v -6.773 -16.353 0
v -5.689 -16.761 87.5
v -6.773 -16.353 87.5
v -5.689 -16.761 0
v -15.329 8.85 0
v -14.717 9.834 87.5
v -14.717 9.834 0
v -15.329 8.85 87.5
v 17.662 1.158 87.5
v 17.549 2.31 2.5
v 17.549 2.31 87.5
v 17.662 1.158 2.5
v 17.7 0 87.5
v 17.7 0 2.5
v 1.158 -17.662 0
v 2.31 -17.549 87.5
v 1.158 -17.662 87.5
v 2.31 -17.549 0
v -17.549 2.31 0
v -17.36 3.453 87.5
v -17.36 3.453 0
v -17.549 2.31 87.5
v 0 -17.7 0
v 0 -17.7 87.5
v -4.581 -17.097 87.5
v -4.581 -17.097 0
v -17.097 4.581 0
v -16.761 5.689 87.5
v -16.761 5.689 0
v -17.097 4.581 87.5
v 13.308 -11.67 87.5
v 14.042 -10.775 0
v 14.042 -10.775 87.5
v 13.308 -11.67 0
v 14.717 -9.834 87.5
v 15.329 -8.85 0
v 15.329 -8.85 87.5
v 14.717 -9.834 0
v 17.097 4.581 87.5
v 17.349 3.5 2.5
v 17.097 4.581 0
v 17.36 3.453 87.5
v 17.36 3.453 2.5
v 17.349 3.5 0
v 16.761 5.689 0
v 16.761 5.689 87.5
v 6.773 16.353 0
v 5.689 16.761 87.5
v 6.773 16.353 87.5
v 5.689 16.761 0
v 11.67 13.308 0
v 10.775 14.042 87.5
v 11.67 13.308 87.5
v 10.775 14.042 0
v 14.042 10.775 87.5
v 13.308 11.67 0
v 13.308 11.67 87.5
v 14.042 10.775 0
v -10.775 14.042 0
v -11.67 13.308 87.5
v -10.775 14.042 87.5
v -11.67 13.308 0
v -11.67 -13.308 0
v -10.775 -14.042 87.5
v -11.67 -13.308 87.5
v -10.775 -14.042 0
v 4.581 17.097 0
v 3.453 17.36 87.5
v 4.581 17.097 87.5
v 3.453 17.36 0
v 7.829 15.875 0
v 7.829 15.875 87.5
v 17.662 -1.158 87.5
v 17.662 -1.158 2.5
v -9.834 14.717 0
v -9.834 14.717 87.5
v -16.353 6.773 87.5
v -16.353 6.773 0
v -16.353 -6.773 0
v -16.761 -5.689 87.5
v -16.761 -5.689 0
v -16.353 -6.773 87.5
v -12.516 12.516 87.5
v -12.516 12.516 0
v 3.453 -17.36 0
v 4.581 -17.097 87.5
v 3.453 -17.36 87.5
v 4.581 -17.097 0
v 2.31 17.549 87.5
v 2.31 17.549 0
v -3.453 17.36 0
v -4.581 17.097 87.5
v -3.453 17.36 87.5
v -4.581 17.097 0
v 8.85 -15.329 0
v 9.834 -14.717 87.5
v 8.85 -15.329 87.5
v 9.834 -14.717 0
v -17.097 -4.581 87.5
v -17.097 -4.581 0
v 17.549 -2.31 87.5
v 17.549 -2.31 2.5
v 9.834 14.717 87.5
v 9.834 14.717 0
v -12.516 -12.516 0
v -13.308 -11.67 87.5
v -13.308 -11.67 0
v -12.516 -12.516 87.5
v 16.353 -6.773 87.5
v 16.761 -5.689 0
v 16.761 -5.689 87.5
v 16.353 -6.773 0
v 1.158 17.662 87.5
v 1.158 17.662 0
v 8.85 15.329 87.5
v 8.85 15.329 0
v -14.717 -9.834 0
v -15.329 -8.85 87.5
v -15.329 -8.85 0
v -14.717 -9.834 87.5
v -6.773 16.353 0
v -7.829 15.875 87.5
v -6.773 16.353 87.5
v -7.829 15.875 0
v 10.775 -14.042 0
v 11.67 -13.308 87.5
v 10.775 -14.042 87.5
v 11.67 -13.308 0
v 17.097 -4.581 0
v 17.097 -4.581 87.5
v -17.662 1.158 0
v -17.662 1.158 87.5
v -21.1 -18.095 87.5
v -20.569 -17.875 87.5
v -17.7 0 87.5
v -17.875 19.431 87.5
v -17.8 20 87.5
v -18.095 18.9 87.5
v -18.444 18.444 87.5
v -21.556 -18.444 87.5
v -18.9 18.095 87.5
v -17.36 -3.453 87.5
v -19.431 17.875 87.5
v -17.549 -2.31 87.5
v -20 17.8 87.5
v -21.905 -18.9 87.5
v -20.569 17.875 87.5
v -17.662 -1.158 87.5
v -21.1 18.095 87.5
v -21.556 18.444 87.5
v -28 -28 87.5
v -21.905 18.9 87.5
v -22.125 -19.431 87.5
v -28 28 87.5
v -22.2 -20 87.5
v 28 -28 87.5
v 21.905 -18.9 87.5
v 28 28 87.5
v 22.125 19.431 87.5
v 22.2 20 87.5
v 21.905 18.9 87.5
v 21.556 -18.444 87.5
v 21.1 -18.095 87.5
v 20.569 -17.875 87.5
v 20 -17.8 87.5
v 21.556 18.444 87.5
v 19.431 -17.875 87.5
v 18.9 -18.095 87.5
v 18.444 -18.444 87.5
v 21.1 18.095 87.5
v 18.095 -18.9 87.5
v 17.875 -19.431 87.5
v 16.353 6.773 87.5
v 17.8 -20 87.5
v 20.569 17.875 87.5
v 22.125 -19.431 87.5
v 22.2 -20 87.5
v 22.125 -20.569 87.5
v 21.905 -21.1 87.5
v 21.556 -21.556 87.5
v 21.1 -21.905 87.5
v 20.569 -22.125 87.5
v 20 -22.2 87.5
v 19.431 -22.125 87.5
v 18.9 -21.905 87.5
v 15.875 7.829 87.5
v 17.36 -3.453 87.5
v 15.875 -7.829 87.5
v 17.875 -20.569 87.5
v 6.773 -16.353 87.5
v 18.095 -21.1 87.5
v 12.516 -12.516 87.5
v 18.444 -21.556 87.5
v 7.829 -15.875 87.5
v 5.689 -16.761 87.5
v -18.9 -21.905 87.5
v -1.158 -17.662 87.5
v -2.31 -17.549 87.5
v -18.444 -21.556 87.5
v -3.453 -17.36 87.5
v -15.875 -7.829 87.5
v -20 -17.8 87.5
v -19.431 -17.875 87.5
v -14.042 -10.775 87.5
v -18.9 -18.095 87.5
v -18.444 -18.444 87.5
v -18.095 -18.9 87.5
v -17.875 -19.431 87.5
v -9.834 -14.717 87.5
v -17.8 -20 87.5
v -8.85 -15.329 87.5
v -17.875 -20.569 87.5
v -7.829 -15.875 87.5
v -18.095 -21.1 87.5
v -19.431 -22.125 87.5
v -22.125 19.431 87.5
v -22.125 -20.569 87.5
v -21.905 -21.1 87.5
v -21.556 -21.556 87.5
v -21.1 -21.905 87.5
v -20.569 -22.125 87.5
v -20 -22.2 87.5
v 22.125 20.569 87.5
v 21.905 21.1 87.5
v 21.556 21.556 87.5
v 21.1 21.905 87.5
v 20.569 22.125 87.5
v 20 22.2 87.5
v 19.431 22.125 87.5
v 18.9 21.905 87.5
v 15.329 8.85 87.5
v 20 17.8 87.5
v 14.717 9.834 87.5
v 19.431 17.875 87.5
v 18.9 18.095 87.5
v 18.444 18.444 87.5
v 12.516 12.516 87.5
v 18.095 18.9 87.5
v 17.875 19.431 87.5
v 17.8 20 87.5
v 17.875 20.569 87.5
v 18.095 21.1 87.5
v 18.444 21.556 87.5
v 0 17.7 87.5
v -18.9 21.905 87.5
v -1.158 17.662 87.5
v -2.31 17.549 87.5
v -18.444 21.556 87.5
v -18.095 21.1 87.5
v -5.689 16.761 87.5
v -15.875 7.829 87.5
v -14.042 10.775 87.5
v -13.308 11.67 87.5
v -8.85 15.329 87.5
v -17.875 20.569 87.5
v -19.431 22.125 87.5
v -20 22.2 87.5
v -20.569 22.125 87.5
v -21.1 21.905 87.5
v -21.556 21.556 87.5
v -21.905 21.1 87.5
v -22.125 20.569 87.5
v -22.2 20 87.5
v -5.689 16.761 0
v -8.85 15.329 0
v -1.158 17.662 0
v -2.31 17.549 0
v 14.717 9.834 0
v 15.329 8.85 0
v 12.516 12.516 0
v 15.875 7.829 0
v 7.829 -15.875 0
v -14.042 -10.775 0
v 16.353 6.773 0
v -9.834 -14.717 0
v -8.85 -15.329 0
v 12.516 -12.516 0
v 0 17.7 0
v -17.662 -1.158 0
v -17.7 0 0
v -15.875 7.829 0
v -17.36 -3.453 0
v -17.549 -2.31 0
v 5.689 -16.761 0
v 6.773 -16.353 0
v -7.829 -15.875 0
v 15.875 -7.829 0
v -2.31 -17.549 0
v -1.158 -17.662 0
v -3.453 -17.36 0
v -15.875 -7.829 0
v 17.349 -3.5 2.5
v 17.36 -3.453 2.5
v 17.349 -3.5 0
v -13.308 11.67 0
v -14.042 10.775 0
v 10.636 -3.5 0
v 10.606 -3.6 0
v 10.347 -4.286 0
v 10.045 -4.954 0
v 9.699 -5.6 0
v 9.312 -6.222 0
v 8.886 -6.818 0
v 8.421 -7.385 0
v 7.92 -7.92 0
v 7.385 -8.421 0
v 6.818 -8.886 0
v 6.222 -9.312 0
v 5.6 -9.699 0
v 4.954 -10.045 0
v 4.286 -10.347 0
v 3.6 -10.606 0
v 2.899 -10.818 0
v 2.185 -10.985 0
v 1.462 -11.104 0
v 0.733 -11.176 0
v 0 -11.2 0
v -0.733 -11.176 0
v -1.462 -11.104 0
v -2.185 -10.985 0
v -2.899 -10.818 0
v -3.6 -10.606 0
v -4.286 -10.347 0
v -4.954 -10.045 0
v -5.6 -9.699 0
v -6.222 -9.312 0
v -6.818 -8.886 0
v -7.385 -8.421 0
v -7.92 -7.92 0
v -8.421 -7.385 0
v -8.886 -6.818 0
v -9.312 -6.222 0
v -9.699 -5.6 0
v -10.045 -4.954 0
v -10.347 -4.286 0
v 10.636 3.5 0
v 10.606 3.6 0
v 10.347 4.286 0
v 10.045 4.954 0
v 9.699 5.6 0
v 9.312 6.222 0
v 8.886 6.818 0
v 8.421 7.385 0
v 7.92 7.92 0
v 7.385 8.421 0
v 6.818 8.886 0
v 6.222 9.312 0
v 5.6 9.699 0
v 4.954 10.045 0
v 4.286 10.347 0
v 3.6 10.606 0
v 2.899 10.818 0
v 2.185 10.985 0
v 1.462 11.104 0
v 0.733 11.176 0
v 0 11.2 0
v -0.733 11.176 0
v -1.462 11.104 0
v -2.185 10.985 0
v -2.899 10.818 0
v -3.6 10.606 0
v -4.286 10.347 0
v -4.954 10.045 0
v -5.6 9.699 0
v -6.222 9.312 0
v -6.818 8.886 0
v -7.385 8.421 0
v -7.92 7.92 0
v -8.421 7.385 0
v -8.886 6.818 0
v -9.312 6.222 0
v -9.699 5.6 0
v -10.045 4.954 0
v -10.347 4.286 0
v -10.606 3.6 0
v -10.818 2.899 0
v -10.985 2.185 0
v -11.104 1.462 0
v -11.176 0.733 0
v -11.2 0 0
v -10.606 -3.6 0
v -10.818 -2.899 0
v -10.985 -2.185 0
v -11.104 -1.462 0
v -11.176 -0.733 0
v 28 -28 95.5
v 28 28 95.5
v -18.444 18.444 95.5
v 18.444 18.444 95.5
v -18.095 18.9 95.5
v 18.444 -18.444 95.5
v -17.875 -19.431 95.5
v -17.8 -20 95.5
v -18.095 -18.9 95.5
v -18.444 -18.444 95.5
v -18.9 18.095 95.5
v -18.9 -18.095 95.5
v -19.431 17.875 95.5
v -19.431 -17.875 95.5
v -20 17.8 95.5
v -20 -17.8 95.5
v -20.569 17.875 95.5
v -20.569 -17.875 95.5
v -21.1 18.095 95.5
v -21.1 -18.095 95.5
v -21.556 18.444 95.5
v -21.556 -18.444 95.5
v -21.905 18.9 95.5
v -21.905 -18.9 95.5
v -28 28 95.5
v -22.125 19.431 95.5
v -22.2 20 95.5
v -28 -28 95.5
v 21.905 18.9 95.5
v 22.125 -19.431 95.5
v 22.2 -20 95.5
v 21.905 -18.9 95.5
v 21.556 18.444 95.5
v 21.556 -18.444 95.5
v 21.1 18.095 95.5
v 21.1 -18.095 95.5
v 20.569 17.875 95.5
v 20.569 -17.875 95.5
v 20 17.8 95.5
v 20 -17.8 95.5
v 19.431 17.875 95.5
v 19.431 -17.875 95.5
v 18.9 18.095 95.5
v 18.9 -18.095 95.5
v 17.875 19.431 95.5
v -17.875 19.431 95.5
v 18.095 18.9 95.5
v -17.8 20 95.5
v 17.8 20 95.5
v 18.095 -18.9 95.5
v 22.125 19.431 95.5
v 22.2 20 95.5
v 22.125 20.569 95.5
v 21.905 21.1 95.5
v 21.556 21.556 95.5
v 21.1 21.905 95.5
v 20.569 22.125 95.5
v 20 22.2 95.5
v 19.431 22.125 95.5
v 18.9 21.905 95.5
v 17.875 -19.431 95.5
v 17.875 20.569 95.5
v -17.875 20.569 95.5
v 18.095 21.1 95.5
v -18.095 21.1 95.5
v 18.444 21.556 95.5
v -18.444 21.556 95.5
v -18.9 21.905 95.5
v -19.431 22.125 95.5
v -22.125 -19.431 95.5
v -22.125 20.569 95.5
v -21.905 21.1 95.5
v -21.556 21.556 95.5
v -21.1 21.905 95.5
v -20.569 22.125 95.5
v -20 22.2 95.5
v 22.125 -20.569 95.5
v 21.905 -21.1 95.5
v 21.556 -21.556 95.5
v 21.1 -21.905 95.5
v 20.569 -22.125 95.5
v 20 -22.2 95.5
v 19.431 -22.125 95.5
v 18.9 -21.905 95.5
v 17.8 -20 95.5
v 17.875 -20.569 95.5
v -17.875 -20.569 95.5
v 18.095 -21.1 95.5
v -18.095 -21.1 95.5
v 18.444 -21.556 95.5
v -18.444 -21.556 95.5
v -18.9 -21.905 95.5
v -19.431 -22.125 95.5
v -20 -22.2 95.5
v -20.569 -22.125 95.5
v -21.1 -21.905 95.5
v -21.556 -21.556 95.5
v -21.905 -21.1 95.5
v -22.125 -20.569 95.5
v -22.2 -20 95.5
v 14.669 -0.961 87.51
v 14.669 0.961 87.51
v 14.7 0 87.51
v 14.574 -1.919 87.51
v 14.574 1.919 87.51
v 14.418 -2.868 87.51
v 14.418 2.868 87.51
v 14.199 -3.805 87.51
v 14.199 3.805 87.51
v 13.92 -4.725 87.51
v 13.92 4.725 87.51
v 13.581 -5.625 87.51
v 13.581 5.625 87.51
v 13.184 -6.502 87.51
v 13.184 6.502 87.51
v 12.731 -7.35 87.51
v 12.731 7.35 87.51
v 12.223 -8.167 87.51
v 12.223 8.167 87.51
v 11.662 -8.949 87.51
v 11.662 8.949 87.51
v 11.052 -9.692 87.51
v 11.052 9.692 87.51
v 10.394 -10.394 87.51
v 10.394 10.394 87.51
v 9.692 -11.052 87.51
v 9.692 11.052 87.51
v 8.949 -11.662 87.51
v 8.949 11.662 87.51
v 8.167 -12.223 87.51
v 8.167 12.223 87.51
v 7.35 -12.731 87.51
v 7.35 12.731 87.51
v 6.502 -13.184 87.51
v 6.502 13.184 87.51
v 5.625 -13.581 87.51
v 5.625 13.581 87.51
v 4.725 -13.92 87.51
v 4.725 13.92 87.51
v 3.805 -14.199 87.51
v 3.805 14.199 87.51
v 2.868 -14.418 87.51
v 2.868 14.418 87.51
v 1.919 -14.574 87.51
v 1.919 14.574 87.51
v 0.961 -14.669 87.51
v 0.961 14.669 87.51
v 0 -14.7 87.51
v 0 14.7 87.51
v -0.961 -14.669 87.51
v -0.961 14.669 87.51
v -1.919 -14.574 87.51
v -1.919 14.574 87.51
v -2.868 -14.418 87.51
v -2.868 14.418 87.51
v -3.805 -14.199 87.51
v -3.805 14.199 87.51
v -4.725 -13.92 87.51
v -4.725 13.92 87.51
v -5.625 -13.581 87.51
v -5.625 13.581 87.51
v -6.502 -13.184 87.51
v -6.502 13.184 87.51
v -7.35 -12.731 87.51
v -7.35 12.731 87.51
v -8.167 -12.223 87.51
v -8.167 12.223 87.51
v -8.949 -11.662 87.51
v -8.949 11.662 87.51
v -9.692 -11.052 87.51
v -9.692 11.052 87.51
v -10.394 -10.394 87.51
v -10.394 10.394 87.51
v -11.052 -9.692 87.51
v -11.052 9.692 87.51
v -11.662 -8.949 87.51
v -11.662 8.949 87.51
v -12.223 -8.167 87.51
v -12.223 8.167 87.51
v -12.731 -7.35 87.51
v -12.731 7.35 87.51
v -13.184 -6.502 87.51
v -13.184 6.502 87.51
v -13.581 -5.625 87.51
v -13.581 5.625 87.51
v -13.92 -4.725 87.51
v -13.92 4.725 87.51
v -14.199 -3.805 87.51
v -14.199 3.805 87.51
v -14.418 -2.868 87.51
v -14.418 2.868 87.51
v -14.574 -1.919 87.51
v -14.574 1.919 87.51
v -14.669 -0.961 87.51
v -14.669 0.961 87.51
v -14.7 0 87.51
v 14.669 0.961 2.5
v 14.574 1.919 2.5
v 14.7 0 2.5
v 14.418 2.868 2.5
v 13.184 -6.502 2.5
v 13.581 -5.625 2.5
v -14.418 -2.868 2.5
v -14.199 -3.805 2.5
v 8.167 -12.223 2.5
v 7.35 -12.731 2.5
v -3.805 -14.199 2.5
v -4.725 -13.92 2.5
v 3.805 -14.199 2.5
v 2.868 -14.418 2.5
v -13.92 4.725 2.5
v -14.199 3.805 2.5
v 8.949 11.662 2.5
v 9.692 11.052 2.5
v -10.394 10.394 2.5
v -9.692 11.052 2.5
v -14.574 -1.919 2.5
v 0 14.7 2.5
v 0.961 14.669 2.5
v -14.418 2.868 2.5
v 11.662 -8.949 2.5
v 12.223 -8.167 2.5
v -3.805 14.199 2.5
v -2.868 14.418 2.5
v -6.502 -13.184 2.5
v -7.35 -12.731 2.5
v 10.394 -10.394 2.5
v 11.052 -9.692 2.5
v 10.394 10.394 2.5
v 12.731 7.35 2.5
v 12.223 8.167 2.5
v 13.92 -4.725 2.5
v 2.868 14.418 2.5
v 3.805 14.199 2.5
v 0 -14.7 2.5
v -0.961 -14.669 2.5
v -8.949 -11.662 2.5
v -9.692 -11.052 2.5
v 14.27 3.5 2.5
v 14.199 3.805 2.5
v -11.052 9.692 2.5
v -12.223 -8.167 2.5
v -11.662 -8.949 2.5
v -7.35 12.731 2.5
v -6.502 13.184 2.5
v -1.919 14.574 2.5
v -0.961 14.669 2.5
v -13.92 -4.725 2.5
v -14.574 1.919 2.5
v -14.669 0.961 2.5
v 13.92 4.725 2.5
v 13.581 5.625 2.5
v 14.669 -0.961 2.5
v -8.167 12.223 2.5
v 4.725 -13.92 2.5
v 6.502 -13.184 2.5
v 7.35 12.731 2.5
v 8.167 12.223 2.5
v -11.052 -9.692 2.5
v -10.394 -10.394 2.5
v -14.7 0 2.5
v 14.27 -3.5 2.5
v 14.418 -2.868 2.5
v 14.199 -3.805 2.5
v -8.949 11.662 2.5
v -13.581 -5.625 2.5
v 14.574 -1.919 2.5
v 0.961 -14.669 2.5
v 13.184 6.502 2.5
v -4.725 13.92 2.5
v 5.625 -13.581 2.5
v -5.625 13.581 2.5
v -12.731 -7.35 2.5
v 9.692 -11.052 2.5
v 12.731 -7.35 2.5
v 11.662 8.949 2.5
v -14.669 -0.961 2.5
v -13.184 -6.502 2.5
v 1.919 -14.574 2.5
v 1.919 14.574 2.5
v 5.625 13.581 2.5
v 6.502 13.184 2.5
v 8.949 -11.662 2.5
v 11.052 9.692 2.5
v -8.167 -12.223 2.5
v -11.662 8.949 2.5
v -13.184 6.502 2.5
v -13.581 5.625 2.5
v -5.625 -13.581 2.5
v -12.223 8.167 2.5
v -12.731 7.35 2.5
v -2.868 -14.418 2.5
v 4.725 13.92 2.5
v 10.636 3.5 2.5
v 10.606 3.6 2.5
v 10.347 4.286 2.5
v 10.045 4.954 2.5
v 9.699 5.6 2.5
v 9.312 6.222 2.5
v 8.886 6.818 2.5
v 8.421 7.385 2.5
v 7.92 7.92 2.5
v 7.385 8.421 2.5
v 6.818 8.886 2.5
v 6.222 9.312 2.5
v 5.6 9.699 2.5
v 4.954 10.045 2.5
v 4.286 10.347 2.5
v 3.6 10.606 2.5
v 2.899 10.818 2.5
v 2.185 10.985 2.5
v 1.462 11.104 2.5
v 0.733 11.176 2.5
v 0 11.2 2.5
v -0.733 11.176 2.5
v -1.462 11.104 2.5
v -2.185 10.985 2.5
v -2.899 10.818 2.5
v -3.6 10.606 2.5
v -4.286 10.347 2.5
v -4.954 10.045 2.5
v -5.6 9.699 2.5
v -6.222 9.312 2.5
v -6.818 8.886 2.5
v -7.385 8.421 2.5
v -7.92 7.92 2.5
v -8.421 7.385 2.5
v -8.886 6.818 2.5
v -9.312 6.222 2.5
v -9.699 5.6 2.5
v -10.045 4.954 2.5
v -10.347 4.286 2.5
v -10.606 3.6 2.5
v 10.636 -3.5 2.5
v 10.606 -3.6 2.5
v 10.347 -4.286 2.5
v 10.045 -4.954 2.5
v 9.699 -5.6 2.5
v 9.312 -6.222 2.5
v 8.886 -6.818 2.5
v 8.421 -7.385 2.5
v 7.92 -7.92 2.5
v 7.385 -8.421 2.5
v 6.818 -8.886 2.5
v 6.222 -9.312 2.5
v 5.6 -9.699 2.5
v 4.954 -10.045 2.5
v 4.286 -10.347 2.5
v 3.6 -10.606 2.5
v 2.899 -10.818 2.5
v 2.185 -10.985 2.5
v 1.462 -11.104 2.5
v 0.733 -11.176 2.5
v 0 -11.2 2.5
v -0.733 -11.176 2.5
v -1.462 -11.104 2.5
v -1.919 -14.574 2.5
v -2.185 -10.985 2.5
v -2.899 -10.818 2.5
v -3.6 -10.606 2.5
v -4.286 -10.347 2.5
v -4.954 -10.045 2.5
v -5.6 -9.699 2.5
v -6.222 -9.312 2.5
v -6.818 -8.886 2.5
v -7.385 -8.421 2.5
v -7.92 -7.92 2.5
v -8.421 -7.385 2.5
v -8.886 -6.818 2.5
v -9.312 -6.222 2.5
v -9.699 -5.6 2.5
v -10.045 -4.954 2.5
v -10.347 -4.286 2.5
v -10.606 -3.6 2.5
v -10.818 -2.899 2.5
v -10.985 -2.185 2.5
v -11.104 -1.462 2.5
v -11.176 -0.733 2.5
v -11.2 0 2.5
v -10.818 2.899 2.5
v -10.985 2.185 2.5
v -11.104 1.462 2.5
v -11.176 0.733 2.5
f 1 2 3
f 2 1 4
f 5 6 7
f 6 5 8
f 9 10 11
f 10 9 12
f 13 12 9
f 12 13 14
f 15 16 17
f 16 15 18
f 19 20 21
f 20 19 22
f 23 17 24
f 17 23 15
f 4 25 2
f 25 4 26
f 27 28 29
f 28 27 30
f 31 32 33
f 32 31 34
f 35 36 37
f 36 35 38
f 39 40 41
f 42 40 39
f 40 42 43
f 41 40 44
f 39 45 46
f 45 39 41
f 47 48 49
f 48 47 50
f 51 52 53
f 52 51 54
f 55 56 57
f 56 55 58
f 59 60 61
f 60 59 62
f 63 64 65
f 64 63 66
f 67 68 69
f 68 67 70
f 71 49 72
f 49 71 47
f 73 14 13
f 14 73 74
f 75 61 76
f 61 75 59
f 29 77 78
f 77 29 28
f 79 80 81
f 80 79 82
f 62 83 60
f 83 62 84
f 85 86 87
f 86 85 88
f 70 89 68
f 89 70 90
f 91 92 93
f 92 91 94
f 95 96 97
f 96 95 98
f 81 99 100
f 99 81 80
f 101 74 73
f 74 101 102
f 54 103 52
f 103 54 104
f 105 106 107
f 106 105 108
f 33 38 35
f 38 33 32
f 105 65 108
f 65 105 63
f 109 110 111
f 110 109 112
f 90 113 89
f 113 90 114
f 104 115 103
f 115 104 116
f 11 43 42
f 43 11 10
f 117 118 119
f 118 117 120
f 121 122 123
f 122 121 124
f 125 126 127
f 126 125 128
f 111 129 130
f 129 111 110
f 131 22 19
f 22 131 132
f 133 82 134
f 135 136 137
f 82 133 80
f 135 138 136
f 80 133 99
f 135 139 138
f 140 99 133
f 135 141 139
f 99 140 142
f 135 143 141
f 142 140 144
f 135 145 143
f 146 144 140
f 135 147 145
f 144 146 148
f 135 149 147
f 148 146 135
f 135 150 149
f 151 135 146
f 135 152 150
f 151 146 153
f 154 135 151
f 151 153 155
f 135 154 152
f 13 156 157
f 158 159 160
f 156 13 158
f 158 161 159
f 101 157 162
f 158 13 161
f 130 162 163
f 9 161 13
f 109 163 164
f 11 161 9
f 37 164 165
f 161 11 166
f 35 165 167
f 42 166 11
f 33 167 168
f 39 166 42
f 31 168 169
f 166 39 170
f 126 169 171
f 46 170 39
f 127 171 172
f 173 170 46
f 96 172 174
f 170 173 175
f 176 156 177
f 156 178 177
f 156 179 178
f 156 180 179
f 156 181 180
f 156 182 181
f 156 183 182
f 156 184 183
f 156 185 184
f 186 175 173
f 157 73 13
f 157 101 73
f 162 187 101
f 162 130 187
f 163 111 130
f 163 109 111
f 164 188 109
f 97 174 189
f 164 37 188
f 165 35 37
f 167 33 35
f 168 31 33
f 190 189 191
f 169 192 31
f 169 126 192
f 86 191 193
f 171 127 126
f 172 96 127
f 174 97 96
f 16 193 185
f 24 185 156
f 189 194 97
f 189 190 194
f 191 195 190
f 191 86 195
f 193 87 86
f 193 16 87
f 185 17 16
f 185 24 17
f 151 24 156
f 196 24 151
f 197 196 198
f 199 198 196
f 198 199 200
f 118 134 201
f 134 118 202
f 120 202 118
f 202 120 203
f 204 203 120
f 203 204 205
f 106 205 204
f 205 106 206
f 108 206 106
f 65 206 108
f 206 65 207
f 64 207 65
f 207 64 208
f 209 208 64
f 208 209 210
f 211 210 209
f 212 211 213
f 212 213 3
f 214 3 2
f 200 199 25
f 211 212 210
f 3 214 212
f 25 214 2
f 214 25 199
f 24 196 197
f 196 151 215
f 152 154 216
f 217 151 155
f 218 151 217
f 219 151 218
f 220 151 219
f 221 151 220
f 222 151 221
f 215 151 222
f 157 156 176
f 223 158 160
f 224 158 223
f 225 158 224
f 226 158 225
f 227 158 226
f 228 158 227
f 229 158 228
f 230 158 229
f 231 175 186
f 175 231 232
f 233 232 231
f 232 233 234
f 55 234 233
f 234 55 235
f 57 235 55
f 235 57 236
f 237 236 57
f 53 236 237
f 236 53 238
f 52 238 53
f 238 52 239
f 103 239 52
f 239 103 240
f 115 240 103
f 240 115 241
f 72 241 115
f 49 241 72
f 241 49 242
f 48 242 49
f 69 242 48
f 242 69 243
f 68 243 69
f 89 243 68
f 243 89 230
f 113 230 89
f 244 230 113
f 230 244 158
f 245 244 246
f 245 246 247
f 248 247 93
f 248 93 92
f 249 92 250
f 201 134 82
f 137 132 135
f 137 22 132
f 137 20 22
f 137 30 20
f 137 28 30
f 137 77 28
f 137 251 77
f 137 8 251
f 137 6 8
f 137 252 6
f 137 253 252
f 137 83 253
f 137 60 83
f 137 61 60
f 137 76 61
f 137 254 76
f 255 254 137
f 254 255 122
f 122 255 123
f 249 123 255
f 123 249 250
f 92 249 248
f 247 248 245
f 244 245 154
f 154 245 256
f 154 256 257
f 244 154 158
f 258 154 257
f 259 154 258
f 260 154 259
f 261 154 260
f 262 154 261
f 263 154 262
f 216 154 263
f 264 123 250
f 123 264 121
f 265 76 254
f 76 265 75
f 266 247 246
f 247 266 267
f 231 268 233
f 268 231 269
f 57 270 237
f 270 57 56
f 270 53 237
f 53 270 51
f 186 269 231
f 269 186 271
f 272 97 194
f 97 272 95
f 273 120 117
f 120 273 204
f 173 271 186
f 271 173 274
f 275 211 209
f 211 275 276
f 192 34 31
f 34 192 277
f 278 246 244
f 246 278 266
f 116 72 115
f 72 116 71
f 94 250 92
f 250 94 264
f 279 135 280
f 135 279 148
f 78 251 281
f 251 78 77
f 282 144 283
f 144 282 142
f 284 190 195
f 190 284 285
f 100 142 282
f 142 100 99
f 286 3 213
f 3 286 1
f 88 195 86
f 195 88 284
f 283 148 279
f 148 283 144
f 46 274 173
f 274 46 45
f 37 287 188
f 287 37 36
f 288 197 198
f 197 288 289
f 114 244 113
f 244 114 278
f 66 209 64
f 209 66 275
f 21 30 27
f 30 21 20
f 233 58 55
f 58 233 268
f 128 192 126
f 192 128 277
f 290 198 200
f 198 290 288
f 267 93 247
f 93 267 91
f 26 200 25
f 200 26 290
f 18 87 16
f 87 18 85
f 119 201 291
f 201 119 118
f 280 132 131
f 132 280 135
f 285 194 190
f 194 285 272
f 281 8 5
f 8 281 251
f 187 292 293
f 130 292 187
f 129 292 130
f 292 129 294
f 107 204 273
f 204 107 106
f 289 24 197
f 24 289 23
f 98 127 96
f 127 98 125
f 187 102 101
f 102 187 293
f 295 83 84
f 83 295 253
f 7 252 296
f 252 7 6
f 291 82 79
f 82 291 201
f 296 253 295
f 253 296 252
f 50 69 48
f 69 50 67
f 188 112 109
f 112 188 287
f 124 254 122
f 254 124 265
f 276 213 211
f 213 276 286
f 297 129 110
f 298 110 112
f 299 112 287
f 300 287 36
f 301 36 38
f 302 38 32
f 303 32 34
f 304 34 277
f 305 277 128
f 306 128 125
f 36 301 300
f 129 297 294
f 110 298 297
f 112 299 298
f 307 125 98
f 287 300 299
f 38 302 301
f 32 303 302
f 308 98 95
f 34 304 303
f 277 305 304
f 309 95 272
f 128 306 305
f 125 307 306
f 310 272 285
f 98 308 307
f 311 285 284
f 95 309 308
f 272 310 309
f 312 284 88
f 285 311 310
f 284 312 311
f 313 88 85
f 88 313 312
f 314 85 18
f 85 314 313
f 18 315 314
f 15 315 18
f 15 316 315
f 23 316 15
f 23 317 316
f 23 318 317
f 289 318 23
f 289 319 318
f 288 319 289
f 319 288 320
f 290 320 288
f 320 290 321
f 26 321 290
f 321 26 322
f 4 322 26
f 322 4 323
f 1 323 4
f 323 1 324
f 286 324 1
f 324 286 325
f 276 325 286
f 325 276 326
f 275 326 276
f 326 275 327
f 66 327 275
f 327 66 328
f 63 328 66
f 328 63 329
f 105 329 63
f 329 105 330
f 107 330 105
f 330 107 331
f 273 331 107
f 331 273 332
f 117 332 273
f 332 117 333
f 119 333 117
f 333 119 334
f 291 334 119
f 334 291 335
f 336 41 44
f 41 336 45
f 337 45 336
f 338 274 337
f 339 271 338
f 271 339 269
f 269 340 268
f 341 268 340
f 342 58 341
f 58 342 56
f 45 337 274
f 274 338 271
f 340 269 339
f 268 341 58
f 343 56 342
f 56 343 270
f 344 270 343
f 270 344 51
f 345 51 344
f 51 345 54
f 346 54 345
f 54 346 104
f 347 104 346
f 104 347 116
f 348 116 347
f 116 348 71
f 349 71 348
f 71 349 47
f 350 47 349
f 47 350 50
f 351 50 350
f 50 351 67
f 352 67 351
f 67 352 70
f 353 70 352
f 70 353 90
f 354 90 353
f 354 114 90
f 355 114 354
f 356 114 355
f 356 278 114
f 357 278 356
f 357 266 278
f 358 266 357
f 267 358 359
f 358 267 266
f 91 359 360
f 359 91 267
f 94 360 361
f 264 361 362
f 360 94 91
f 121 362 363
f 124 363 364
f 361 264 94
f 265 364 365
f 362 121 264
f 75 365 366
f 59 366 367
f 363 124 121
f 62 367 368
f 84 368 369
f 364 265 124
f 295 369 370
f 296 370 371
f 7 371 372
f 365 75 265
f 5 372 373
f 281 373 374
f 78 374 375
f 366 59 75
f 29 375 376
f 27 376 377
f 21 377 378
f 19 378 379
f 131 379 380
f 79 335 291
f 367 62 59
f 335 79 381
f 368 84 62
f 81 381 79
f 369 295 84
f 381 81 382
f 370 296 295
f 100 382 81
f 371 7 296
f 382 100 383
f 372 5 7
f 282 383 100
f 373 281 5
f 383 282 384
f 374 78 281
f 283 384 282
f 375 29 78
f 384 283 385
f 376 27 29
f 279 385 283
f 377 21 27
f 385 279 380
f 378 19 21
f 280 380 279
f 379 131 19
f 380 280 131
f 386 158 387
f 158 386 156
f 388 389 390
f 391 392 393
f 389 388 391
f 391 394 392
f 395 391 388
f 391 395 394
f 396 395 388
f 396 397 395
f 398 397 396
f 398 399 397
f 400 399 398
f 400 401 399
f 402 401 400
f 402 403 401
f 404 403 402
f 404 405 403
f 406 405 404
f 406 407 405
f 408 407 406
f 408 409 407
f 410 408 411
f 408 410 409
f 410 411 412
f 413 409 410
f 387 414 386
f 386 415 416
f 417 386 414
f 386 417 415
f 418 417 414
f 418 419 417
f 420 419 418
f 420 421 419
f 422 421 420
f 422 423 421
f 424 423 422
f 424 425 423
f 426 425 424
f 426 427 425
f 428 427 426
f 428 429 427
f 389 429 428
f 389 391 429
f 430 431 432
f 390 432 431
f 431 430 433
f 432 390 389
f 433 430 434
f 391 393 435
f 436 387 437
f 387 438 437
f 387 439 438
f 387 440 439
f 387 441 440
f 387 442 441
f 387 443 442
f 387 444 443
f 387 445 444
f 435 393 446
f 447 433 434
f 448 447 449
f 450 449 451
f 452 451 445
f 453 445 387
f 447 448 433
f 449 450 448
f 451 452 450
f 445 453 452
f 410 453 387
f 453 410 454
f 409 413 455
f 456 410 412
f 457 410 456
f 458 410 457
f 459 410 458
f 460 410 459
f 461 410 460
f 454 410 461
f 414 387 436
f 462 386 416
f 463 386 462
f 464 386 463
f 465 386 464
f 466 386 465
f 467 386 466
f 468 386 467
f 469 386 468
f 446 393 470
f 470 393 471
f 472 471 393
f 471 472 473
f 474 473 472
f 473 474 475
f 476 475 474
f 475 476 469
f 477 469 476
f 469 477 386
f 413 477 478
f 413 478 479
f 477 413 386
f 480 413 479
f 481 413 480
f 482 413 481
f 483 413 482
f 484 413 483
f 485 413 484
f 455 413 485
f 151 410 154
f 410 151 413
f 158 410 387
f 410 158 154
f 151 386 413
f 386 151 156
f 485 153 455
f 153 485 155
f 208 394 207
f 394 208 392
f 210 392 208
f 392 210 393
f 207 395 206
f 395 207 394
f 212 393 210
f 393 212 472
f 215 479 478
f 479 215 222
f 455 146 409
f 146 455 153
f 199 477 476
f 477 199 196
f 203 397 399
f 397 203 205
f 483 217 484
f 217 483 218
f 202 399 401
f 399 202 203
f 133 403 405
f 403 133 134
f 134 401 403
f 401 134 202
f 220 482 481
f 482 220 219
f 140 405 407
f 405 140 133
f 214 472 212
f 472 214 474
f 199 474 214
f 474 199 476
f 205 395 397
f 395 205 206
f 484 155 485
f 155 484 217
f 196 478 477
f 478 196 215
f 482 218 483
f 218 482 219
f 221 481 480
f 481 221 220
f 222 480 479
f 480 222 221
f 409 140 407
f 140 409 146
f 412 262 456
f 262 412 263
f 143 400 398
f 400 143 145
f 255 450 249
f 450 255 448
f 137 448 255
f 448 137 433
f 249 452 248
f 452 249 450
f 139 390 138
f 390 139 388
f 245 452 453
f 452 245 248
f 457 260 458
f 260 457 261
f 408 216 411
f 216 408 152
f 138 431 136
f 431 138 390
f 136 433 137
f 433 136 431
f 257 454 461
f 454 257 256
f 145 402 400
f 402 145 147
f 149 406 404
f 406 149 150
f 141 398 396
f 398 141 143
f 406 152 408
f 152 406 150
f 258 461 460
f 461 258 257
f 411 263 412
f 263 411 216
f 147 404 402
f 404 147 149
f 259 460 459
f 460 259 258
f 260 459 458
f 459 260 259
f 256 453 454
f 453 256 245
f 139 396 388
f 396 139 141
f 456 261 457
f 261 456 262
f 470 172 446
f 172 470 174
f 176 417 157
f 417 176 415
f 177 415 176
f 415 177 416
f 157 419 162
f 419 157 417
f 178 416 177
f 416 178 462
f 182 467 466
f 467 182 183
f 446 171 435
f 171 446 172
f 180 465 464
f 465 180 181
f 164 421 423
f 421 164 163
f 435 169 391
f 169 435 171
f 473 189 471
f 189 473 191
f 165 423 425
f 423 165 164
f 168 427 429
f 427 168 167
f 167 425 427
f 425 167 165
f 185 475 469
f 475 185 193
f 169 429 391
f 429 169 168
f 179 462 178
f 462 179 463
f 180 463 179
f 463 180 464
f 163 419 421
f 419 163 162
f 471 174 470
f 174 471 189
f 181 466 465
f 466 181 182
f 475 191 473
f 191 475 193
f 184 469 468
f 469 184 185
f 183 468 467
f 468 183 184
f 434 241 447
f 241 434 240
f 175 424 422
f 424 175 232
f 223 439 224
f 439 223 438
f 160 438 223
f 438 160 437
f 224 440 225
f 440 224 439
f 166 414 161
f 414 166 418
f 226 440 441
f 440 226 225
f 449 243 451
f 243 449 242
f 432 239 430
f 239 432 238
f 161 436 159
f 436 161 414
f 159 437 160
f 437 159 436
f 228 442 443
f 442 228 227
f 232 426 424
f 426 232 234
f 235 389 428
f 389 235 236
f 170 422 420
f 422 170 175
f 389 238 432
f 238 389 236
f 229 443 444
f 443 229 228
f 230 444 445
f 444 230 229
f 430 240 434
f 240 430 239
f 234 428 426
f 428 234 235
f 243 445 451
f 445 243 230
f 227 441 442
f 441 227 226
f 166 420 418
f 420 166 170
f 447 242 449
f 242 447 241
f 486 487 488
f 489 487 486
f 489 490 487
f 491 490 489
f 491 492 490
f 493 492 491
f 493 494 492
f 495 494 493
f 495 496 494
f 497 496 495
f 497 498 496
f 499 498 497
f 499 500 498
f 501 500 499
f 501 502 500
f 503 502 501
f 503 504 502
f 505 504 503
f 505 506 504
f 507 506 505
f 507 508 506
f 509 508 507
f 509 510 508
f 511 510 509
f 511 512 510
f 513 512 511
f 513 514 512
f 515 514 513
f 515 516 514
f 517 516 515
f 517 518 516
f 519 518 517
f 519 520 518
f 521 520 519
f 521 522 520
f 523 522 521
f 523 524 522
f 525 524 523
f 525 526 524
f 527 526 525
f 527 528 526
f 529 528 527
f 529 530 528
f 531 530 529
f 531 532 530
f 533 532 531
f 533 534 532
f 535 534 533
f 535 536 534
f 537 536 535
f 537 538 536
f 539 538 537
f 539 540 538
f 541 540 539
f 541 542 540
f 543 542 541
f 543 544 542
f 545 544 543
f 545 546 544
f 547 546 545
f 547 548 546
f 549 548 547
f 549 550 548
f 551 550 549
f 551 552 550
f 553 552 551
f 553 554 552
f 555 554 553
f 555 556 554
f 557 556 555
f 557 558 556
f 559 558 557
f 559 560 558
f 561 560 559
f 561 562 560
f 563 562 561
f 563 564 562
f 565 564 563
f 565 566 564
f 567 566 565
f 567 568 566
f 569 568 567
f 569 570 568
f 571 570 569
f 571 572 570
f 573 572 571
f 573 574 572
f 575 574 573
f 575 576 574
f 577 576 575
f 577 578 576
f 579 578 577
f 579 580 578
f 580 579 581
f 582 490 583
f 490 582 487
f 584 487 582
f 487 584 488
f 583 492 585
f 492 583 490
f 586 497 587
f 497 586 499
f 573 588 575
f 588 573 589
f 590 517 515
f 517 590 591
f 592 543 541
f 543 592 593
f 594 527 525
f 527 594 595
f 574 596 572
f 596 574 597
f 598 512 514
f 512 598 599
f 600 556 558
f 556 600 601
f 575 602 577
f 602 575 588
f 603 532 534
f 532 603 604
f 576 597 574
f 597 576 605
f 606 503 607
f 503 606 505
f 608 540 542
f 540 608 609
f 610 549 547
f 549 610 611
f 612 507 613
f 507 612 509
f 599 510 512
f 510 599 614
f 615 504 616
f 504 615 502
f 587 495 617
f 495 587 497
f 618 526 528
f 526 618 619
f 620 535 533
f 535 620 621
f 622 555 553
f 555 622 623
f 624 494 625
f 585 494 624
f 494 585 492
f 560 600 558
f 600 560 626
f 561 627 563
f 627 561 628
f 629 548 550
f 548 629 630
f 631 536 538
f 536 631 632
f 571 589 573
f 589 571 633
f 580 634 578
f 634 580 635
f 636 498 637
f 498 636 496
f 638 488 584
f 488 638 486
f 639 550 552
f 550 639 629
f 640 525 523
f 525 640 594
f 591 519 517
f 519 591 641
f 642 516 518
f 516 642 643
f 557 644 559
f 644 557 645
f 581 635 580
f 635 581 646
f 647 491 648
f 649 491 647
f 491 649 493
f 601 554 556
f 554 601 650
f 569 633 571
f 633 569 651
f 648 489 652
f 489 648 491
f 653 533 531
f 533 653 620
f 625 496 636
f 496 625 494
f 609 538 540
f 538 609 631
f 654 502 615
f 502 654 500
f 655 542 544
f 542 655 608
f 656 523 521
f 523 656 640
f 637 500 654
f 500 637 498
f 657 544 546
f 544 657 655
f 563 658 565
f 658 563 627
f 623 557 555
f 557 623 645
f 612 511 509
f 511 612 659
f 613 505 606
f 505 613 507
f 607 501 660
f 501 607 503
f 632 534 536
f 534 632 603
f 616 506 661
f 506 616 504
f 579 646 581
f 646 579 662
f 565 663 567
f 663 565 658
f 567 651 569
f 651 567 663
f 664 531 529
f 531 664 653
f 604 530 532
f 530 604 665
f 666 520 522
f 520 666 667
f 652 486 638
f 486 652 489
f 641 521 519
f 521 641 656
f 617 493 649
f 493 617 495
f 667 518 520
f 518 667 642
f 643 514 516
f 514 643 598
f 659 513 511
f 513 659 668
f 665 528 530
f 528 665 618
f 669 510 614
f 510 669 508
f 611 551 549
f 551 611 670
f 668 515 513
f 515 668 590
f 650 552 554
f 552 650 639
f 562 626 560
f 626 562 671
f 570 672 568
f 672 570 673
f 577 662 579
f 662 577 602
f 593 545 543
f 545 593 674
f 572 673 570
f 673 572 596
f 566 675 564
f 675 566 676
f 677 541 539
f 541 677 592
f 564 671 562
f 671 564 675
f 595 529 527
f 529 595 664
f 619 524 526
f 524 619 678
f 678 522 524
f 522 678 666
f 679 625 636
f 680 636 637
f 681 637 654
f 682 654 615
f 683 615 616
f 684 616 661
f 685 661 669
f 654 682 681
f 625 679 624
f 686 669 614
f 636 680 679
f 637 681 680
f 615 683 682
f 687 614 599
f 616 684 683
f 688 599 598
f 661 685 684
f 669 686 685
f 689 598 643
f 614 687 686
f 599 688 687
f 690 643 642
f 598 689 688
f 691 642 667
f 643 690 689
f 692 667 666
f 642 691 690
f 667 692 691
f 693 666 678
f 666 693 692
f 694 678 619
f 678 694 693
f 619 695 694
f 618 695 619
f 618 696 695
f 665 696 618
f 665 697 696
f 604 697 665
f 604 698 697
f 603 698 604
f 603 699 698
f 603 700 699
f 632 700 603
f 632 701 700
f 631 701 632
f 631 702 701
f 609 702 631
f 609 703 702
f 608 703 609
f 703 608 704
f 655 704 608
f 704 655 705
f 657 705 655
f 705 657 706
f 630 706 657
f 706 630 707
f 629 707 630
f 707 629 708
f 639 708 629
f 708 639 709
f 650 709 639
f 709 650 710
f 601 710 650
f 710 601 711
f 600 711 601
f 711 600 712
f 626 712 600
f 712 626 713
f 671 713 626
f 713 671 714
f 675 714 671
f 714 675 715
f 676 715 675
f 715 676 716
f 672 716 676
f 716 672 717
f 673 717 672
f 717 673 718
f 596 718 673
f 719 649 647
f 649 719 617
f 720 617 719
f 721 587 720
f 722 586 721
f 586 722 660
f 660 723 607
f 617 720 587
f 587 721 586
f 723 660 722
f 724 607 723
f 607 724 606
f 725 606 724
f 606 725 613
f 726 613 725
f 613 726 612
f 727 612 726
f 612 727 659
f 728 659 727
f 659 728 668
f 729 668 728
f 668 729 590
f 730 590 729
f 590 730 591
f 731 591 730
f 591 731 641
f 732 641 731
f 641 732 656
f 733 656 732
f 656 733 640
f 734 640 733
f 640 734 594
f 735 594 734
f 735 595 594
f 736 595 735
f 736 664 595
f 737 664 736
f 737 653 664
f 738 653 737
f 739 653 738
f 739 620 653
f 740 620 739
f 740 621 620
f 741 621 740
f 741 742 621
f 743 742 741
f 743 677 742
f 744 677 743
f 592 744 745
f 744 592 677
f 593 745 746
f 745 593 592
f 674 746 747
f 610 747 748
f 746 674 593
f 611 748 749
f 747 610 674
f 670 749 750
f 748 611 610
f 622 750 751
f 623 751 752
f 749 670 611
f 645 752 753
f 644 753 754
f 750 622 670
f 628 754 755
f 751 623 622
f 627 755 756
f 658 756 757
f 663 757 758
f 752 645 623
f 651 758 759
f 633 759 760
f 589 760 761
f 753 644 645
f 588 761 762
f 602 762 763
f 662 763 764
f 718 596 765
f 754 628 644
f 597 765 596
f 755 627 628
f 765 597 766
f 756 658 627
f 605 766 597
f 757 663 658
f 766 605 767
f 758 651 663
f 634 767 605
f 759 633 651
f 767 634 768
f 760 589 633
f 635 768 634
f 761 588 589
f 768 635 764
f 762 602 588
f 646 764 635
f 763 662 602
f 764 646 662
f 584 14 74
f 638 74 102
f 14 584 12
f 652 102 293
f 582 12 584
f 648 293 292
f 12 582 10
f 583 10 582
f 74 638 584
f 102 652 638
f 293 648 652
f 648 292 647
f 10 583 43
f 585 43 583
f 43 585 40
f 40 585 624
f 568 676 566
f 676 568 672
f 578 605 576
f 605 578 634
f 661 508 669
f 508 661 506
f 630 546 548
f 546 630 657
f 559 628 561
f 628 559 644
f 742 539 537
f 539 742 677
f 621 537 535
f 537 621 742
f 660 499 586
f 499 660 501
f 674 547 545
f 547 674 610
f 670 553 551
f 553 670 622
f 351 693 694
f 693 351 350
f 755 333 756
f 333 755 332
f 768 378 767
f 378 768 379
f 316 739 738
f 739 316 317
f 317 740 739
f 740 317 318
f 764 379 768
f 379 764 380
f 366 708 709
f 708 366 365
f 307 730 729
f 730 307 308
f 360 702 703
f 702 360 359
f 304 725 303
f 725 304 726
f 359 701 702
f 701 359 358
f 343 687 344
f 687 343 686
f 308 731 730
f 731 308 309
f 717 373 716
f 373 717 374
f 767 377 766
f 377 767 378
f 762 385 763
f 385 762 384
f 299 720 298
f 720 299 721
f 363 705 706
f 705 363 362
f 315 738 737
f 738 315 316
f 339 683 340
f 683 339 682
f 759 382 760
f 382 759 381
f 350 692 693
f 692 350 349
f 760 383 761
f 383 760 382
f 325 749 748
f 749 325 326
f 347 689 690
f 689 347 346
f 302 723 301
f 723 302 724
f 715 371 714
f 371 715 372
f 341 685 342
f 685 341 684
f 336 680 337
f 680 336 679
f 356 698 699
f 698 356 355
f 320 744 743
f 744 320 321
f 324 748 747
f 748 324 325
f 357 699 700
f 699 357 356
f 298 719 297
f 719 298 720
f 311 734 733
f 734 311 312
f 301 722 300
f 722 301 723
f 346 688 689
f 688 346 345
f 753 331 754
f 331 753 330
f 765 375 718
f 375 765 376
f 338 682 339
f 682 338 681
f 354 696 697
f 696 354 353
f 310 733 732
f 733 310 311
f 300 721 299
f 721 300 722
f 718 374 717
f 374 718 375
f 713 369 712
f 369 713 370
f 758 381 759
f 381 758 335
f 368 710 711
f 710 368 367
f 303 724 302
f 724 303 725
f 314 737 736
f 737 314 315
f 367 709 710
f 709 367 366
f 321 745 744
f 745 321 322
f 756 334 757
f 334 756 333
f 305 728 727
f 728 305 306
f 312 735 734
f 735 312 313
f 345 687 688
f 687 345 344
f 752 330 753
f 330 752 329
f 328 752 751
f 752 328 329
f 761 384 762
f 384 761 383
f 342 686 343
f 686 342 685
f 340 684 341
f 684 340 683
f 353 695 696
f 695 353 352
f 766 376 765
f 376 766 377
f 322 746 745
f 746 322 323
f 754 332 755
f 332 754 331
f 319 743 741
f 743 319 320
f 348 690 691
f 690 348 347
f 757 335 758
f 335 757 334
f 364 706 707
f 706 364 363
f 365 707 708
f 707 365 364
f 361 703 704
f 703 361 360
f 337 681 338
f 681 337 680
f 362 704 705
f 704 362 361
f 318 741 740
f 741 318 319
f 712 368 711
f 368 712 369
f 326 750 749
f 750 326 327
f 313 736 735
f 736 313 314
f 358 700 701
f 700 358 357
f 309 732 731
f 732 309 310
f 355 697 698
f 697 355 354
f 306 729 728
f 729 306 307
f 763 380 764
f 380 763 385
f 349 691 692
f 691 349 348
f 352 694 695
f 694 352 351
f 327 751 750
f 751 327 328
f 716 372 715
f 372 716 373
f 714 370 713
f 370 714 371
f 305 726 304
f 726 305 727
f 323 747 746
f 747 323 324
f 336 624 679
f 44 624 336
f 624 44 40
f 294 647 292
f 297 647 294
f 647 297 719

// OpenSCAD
// SUPERSEDED: this is the old nozzle-DOWN holder. The current nozzle-UP design is cup.scad + cage.scad (kept here for reference only).
// Scoudouc 0 thrust stand: motor holder (OpenSCAD).
// Motor hangs NOZZLE-DOWN. Thrust pushes the motor UP, so the top of the motor presses on the
// thick top plate, and the plate pushes up on the load cell platform. A lip at the bottom stops
// the motor sliding out under its own weight before ignition. Exhaust leaves through the open bottom.
//
// Change the numbers in this first block, then render (F6) and export STL.
// Print in PLA (university printers), 4 perimeters, 40% infill, tube upright, LIBRARY printer (~2 h on an MK3).
// PLA softens near a hot casing: line the bore with a cardboard tube (an 18/24/29 mm spent casing wrap works) and
// expect to replace the holder after a few firings. Check it for softening after every burn.

motor_d   = 29;     // motor casing diameter in mm: 24 or 29 (18 also allowed, e.g. for C6)
holder_len = 85;    // tube length in mm, 70 to 100 (F15 is about 98 mm long: use 100)
clearance = 0.4;    // extra gap around the motor so it slides in (raise if your printer is tight)
wall      = 3;      // tube wall thickness in mm
plate_t   = 8;      // top thrust plate thickness in mm
lip_t     = 2.5;    // bottom retaining lip height in mm
lip_inset = 3.5;    // how far the lip reaches in from the casing wall (nozzle must still fit through)
bolt_sq   = 40;     // M4 bolt holes sit on a square this wide (match your load cell platform)
bolt_d    = 4.4;    // M4 clearance hole
flange_w  = 56;     // square top flange width
lead_slot = 7;      // notch in the lip so igniter leads can leave sideways

assert(motor_d == 18 || motor_d == 24 || motor_d == 29, "motor_d must be 18, 24 or 29");
assert(holder_len >= 70 && holder_len <= 100, "holder_len must be between 70 and 100 mm");

bore  = motor_d + clearance;
outer = bore + 2 * wall;
$fn = 96;

module holder() {
  difference() {
    union() {
      // the tube
      translate([0, 0, lip_t]) cylinder(d = outer, h = holder_len);
      // the lip ring at the bottom
      cylinder(d = outer, h = lip_t + 0.01);
      // the square top flange with bolt holes, sitting on top of the tube
      translate([-flange_w / 2, -flange_w / 2, lip_t + holder_len])
        cube([flange_w, flange_w, plate_t]);
    }
    // motor bore (stops short of the thick top plate, so the motor top touches the plate)
    translate([0, 0, lip_t]) cylinder(d = bore, h = holder_len + 0.01);
    // opening through the lip: smaller than the casing, bigger than the nozzle
    translate([0, 0, -1]) cylinder(d = bore - 2 * lip_inset, h = lip_t + 2);
    // notch for igniter leads
    translate([0, 0, -1]) translate([bore / 2 - lip_inset - 1, -lead_slot / 2, 0])
      cube([outer, lead_slot, lip_t + 1]);
    // four M4 mounting holes through the flange
    for (x = [-1, 1], y = [-1, 1])
      translate([x * bolt_sq / 2, y * bolt_sq / 2, lip_t + holder_len - 1])
        cylinder(d = bolt_d, h = plate_t + 2, $fn = 24);
  }
}

holder();
